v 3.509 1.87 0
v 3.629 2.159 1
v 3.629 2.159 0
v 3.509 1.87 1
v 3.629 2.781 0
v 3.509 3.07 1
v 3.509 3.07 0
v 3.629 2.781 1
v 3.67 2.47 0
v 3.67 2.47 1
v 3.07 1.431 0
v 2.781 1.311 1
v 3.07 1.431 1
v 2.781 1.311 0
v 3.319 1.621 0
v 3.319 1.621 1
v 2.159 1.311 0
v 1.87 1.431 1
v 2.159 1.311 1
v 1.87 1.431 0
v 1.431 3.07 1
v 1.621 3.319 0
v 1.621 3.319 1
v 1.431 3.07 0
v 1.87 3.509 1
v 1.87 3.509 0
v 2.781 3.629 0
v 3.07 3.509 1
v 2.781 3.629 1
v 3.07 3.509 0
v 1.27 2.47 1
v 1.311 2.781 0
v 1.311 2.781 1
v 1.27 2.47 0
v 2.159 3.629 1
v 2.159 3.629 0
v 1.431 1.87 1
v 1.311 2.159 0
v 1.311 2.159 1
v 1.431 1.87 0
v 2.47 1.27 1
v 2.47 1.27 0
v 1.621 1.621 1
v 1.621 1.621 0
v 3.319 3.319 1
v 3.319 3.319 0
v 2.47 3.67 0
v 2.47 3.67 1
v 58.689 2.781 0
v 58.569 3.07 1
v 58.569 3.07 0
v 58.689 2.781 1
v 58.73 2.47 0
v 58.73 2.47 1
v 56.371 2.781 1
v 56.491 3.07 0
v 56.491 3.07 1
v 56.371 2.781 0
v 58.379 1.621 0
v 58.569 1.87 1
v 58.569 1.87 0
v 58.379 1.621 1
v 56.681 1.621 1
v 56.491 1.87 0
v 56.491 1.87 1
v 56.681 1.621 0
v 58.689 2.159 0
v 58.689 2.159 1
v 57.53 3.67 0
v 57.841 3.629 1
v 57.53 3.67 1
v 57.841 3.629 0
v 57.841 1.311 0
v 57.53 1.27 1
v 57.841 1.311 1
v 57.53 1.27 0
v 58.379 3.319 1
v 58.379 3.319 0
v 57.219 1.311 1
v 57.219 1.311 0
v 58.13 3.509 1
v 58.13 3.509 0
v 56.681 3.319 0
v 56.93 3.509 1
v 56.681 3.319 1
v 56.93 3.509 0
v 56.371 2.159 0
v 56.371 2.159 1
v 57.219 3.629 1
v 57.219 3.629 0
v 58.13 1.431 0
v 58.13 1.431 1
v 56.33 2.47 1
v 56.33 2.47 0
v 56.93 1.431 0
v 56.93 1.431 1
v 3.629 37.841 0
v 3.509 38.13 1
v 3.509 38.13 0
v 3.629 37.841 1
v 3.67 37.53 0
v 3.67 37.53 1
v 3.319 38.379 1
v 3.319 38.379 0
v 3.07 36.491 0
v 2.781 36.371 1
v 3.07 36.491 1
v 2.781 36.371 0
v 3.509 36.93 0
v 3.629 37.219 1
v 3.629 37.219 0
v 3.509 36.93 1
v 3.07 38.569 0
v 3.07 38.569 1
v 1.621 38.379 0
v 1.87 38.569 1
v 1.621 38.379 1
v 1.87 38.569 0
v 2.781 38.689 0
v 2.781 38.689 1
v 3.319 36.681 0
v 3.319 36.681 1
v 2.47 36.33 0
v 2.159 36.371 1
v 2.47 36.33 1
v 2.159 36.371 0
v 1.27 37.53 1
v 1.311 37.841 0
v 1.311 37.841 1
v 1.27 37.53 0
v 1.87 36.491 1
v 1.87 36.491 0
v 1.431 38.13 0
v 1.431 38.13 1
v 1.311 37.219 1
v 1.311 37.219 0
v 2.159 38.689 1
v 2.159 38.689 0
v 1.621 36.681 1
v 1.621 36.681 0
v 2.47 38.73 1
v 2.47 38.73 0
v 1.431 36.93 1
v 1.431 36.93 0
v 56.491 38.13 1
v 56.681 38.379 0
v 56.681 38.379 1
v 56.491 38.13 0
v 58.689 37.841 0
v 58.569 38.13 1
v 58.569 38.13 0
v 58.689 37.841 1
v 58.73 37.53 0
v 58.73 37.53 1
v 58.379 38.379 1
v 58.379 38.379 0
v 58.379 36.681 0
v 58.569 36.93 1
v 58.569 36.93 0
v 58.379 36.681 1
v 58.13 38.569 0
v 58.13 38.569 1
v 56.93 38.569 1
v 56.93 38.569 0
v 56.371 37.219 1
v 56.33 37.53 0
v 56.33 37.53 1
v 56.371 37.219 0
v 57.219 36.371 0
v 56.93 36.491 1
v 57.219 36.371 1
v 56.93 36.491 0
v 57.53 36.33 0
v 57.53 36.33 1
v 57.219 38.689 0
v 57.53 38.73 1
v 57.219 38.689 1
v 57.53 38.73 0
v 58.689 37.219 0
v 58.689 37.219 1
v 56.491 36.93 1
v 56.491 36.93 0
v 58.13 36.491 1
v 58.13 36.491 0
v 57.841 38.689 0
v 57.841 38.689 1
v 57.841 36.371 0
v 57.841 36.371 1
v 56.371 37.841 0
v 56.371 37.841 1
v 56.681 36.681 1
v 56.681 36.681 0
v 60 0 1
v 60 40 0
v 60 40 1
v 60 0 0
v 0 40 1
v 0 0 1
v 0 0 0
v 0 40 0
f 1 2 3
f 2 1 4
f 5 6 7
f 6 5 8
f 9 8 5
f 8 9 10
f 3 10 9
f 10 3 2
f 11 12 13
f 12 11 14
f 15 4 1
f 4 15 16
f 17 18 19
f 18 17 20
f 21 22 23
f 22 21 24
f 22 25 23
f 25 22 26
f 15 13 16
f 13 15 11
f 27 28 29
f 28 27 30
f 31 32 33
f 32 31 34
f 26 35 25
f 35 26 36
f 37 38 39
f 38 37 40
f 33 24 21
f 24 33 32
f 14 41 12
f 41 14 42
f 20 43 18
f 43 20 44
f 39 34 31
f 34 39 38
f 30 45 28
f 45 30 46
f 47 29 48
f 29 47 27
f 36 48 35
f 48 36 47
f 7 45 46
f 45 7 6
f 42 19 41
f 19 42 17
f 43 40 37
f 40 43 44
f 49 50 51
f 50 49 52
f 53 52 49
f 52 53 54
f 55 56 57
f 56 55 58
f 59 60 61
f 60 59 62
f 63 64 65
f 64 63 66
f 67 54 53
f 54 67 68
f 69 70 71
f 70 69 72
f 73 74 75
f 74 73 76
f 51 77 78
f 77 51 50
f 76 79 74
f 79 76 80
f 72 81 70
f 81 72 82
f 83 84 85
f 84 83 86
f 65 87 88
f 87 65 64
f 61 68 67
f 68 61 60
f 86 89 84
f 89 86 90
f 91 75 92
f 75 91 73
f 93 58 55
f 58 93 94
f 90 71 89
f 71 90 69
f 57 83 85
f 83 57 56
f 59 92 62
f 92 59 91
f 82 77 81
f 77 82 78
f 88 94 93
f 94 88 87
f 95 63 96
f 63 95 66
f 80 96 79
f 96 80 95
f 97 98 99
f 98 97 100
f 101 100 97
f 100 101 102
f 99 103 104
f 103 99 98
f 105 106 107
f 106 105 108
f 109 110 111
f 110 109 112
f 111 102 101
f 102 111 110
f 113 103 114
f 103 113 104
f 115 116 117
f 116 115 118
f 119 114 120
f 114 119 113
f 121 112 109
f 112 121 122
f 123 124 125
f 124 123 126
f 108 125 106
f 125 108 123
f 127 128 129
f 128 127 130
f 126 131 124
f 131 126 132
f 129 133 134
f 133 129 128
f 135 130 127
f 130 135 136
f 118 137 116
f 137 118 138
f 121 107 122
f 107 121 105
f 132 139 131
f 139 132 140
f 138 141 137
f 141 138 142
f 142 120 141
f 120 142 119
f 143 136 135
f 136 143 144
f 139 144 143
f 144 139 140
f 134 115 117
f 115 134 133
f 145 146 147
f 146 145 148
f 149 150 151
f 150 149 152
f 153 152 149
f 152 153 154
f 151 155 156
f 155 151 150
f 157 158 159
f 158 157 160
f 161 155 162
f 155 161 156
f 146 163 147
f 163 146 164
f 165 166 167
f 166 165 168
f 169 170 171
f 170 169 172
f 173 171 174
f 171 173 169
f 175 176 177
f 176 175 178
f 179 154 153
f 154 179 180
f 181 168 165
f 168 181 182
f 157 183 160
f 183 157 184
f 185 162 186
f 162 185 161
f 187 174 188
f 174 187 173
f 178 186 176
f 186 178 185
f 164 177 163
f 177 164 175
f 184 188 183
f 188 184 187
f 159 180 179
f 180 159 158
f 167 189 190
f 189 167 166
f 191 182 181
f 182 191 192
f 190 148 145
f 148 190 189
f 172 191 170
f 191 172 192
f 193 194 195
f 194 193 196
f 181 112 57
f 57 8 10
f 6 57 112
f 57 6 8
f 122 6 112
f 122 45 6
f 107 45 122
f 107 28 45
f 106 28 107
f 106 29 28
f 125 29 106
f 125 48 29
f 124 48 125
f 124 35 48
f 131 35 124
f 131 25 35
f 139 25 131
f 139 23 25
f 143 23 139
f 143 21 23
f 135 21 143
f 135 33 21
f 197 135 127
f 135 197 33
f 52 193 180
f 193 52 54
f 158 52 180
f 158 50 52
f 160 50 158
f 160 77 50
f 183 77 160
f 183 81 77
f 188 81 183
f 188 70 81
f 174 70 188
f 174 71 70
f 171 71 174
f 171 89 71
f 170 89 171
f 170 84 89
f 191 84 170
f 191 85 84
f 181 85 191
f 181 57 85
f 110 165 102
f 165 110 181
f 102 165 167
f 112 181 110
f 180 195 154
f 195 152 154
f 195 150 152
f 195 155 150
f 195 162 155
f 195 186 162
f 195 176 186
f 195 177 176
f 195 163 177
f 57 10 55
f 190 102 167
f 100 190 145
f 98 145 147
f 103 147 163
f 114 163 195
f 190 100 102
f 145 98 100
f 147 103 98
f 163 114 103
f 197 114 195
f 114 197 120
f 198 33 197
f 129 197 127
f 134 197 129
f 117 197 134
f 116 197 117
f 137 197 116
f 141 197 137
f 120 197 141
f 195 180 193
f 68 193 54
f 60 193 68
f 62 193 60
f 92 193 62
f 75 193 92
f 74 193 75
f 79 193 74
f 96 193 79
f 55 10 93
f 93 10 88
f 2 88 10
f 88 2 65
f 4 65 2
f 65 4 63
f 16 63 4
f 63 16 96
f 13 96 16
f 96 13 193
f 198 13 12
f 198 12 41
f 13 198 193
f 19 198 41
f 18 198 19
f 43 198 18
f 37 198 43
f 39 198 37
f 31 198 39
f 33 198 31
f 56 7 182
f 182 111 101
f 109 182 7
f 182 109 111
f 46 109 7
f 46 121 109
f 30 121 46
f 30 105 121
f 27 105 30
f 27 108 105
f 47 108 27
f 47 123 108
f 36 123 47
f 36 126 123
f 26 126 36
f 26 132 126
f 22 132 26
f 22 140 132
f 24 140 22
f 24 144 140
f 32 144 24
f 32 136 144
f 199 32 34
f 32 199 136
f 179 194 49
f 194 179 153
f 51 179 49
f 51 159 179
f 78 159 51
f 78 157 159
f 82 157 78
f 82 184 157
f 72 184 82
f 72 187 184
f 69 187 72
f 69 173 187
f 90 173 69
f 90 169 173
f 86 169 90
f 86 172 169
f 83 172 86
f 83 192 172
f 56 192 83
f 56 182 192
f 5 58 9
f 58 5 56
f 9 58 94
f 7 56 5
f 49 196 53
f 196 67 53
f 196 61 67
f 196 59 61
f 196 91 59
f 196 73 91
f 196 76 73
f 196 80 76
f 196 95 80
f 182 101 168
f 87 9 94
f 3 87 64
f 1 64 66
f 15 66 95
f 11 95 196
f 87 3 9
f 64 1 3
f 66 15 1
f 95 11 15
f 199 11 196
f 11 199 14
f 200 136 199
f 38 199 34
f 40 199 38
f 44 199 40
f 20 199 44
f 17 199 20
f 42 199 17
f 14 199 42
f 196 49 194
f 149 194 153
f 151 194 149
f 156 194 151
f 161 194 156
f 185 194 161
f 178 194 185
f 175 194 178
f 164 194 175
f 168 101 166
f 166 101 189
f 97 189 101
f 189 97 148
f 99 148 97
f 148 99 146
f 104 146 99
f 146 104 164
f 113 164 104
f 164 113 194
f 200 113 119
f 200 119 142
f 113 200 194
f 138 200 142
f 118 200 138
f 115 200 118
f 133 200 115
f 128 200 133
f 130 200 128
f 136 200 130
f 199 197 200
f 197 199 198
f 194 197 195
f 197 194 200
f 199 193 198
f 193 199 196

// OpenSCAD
// PCB circuit board breadboard
pcb_14x20 = [60, 40, 1];

module circuit_board_mount(def, air=0.2) {
    r = 1+air;
    b = [r+2.54/2,r+2.54/2,1];
    color("Darkgreen")
    union() {
        translate(b)
        cylinder(h=4, r=r, center=true, $fn=24);
        translate([def[0]-b[0],b[1],1])
        cylinder(h=4, r=r, center=true, $fn=24);
        translate([b[0],def[1]-b[1],1])
        cylinder(h=4, r=r, center=true, $fn=24);
        translate([def[0]-b[0],def[1]-b[1],1])
        cylinder(h=4, r=r, center=true, $fn=24);
    }
}

module circuit_board(def) {
    color("Darkgreen")
    difference() {
        cube(def);
        circuit_board_mount(def);
    }
}

circuit_board(pcb_14x20);
